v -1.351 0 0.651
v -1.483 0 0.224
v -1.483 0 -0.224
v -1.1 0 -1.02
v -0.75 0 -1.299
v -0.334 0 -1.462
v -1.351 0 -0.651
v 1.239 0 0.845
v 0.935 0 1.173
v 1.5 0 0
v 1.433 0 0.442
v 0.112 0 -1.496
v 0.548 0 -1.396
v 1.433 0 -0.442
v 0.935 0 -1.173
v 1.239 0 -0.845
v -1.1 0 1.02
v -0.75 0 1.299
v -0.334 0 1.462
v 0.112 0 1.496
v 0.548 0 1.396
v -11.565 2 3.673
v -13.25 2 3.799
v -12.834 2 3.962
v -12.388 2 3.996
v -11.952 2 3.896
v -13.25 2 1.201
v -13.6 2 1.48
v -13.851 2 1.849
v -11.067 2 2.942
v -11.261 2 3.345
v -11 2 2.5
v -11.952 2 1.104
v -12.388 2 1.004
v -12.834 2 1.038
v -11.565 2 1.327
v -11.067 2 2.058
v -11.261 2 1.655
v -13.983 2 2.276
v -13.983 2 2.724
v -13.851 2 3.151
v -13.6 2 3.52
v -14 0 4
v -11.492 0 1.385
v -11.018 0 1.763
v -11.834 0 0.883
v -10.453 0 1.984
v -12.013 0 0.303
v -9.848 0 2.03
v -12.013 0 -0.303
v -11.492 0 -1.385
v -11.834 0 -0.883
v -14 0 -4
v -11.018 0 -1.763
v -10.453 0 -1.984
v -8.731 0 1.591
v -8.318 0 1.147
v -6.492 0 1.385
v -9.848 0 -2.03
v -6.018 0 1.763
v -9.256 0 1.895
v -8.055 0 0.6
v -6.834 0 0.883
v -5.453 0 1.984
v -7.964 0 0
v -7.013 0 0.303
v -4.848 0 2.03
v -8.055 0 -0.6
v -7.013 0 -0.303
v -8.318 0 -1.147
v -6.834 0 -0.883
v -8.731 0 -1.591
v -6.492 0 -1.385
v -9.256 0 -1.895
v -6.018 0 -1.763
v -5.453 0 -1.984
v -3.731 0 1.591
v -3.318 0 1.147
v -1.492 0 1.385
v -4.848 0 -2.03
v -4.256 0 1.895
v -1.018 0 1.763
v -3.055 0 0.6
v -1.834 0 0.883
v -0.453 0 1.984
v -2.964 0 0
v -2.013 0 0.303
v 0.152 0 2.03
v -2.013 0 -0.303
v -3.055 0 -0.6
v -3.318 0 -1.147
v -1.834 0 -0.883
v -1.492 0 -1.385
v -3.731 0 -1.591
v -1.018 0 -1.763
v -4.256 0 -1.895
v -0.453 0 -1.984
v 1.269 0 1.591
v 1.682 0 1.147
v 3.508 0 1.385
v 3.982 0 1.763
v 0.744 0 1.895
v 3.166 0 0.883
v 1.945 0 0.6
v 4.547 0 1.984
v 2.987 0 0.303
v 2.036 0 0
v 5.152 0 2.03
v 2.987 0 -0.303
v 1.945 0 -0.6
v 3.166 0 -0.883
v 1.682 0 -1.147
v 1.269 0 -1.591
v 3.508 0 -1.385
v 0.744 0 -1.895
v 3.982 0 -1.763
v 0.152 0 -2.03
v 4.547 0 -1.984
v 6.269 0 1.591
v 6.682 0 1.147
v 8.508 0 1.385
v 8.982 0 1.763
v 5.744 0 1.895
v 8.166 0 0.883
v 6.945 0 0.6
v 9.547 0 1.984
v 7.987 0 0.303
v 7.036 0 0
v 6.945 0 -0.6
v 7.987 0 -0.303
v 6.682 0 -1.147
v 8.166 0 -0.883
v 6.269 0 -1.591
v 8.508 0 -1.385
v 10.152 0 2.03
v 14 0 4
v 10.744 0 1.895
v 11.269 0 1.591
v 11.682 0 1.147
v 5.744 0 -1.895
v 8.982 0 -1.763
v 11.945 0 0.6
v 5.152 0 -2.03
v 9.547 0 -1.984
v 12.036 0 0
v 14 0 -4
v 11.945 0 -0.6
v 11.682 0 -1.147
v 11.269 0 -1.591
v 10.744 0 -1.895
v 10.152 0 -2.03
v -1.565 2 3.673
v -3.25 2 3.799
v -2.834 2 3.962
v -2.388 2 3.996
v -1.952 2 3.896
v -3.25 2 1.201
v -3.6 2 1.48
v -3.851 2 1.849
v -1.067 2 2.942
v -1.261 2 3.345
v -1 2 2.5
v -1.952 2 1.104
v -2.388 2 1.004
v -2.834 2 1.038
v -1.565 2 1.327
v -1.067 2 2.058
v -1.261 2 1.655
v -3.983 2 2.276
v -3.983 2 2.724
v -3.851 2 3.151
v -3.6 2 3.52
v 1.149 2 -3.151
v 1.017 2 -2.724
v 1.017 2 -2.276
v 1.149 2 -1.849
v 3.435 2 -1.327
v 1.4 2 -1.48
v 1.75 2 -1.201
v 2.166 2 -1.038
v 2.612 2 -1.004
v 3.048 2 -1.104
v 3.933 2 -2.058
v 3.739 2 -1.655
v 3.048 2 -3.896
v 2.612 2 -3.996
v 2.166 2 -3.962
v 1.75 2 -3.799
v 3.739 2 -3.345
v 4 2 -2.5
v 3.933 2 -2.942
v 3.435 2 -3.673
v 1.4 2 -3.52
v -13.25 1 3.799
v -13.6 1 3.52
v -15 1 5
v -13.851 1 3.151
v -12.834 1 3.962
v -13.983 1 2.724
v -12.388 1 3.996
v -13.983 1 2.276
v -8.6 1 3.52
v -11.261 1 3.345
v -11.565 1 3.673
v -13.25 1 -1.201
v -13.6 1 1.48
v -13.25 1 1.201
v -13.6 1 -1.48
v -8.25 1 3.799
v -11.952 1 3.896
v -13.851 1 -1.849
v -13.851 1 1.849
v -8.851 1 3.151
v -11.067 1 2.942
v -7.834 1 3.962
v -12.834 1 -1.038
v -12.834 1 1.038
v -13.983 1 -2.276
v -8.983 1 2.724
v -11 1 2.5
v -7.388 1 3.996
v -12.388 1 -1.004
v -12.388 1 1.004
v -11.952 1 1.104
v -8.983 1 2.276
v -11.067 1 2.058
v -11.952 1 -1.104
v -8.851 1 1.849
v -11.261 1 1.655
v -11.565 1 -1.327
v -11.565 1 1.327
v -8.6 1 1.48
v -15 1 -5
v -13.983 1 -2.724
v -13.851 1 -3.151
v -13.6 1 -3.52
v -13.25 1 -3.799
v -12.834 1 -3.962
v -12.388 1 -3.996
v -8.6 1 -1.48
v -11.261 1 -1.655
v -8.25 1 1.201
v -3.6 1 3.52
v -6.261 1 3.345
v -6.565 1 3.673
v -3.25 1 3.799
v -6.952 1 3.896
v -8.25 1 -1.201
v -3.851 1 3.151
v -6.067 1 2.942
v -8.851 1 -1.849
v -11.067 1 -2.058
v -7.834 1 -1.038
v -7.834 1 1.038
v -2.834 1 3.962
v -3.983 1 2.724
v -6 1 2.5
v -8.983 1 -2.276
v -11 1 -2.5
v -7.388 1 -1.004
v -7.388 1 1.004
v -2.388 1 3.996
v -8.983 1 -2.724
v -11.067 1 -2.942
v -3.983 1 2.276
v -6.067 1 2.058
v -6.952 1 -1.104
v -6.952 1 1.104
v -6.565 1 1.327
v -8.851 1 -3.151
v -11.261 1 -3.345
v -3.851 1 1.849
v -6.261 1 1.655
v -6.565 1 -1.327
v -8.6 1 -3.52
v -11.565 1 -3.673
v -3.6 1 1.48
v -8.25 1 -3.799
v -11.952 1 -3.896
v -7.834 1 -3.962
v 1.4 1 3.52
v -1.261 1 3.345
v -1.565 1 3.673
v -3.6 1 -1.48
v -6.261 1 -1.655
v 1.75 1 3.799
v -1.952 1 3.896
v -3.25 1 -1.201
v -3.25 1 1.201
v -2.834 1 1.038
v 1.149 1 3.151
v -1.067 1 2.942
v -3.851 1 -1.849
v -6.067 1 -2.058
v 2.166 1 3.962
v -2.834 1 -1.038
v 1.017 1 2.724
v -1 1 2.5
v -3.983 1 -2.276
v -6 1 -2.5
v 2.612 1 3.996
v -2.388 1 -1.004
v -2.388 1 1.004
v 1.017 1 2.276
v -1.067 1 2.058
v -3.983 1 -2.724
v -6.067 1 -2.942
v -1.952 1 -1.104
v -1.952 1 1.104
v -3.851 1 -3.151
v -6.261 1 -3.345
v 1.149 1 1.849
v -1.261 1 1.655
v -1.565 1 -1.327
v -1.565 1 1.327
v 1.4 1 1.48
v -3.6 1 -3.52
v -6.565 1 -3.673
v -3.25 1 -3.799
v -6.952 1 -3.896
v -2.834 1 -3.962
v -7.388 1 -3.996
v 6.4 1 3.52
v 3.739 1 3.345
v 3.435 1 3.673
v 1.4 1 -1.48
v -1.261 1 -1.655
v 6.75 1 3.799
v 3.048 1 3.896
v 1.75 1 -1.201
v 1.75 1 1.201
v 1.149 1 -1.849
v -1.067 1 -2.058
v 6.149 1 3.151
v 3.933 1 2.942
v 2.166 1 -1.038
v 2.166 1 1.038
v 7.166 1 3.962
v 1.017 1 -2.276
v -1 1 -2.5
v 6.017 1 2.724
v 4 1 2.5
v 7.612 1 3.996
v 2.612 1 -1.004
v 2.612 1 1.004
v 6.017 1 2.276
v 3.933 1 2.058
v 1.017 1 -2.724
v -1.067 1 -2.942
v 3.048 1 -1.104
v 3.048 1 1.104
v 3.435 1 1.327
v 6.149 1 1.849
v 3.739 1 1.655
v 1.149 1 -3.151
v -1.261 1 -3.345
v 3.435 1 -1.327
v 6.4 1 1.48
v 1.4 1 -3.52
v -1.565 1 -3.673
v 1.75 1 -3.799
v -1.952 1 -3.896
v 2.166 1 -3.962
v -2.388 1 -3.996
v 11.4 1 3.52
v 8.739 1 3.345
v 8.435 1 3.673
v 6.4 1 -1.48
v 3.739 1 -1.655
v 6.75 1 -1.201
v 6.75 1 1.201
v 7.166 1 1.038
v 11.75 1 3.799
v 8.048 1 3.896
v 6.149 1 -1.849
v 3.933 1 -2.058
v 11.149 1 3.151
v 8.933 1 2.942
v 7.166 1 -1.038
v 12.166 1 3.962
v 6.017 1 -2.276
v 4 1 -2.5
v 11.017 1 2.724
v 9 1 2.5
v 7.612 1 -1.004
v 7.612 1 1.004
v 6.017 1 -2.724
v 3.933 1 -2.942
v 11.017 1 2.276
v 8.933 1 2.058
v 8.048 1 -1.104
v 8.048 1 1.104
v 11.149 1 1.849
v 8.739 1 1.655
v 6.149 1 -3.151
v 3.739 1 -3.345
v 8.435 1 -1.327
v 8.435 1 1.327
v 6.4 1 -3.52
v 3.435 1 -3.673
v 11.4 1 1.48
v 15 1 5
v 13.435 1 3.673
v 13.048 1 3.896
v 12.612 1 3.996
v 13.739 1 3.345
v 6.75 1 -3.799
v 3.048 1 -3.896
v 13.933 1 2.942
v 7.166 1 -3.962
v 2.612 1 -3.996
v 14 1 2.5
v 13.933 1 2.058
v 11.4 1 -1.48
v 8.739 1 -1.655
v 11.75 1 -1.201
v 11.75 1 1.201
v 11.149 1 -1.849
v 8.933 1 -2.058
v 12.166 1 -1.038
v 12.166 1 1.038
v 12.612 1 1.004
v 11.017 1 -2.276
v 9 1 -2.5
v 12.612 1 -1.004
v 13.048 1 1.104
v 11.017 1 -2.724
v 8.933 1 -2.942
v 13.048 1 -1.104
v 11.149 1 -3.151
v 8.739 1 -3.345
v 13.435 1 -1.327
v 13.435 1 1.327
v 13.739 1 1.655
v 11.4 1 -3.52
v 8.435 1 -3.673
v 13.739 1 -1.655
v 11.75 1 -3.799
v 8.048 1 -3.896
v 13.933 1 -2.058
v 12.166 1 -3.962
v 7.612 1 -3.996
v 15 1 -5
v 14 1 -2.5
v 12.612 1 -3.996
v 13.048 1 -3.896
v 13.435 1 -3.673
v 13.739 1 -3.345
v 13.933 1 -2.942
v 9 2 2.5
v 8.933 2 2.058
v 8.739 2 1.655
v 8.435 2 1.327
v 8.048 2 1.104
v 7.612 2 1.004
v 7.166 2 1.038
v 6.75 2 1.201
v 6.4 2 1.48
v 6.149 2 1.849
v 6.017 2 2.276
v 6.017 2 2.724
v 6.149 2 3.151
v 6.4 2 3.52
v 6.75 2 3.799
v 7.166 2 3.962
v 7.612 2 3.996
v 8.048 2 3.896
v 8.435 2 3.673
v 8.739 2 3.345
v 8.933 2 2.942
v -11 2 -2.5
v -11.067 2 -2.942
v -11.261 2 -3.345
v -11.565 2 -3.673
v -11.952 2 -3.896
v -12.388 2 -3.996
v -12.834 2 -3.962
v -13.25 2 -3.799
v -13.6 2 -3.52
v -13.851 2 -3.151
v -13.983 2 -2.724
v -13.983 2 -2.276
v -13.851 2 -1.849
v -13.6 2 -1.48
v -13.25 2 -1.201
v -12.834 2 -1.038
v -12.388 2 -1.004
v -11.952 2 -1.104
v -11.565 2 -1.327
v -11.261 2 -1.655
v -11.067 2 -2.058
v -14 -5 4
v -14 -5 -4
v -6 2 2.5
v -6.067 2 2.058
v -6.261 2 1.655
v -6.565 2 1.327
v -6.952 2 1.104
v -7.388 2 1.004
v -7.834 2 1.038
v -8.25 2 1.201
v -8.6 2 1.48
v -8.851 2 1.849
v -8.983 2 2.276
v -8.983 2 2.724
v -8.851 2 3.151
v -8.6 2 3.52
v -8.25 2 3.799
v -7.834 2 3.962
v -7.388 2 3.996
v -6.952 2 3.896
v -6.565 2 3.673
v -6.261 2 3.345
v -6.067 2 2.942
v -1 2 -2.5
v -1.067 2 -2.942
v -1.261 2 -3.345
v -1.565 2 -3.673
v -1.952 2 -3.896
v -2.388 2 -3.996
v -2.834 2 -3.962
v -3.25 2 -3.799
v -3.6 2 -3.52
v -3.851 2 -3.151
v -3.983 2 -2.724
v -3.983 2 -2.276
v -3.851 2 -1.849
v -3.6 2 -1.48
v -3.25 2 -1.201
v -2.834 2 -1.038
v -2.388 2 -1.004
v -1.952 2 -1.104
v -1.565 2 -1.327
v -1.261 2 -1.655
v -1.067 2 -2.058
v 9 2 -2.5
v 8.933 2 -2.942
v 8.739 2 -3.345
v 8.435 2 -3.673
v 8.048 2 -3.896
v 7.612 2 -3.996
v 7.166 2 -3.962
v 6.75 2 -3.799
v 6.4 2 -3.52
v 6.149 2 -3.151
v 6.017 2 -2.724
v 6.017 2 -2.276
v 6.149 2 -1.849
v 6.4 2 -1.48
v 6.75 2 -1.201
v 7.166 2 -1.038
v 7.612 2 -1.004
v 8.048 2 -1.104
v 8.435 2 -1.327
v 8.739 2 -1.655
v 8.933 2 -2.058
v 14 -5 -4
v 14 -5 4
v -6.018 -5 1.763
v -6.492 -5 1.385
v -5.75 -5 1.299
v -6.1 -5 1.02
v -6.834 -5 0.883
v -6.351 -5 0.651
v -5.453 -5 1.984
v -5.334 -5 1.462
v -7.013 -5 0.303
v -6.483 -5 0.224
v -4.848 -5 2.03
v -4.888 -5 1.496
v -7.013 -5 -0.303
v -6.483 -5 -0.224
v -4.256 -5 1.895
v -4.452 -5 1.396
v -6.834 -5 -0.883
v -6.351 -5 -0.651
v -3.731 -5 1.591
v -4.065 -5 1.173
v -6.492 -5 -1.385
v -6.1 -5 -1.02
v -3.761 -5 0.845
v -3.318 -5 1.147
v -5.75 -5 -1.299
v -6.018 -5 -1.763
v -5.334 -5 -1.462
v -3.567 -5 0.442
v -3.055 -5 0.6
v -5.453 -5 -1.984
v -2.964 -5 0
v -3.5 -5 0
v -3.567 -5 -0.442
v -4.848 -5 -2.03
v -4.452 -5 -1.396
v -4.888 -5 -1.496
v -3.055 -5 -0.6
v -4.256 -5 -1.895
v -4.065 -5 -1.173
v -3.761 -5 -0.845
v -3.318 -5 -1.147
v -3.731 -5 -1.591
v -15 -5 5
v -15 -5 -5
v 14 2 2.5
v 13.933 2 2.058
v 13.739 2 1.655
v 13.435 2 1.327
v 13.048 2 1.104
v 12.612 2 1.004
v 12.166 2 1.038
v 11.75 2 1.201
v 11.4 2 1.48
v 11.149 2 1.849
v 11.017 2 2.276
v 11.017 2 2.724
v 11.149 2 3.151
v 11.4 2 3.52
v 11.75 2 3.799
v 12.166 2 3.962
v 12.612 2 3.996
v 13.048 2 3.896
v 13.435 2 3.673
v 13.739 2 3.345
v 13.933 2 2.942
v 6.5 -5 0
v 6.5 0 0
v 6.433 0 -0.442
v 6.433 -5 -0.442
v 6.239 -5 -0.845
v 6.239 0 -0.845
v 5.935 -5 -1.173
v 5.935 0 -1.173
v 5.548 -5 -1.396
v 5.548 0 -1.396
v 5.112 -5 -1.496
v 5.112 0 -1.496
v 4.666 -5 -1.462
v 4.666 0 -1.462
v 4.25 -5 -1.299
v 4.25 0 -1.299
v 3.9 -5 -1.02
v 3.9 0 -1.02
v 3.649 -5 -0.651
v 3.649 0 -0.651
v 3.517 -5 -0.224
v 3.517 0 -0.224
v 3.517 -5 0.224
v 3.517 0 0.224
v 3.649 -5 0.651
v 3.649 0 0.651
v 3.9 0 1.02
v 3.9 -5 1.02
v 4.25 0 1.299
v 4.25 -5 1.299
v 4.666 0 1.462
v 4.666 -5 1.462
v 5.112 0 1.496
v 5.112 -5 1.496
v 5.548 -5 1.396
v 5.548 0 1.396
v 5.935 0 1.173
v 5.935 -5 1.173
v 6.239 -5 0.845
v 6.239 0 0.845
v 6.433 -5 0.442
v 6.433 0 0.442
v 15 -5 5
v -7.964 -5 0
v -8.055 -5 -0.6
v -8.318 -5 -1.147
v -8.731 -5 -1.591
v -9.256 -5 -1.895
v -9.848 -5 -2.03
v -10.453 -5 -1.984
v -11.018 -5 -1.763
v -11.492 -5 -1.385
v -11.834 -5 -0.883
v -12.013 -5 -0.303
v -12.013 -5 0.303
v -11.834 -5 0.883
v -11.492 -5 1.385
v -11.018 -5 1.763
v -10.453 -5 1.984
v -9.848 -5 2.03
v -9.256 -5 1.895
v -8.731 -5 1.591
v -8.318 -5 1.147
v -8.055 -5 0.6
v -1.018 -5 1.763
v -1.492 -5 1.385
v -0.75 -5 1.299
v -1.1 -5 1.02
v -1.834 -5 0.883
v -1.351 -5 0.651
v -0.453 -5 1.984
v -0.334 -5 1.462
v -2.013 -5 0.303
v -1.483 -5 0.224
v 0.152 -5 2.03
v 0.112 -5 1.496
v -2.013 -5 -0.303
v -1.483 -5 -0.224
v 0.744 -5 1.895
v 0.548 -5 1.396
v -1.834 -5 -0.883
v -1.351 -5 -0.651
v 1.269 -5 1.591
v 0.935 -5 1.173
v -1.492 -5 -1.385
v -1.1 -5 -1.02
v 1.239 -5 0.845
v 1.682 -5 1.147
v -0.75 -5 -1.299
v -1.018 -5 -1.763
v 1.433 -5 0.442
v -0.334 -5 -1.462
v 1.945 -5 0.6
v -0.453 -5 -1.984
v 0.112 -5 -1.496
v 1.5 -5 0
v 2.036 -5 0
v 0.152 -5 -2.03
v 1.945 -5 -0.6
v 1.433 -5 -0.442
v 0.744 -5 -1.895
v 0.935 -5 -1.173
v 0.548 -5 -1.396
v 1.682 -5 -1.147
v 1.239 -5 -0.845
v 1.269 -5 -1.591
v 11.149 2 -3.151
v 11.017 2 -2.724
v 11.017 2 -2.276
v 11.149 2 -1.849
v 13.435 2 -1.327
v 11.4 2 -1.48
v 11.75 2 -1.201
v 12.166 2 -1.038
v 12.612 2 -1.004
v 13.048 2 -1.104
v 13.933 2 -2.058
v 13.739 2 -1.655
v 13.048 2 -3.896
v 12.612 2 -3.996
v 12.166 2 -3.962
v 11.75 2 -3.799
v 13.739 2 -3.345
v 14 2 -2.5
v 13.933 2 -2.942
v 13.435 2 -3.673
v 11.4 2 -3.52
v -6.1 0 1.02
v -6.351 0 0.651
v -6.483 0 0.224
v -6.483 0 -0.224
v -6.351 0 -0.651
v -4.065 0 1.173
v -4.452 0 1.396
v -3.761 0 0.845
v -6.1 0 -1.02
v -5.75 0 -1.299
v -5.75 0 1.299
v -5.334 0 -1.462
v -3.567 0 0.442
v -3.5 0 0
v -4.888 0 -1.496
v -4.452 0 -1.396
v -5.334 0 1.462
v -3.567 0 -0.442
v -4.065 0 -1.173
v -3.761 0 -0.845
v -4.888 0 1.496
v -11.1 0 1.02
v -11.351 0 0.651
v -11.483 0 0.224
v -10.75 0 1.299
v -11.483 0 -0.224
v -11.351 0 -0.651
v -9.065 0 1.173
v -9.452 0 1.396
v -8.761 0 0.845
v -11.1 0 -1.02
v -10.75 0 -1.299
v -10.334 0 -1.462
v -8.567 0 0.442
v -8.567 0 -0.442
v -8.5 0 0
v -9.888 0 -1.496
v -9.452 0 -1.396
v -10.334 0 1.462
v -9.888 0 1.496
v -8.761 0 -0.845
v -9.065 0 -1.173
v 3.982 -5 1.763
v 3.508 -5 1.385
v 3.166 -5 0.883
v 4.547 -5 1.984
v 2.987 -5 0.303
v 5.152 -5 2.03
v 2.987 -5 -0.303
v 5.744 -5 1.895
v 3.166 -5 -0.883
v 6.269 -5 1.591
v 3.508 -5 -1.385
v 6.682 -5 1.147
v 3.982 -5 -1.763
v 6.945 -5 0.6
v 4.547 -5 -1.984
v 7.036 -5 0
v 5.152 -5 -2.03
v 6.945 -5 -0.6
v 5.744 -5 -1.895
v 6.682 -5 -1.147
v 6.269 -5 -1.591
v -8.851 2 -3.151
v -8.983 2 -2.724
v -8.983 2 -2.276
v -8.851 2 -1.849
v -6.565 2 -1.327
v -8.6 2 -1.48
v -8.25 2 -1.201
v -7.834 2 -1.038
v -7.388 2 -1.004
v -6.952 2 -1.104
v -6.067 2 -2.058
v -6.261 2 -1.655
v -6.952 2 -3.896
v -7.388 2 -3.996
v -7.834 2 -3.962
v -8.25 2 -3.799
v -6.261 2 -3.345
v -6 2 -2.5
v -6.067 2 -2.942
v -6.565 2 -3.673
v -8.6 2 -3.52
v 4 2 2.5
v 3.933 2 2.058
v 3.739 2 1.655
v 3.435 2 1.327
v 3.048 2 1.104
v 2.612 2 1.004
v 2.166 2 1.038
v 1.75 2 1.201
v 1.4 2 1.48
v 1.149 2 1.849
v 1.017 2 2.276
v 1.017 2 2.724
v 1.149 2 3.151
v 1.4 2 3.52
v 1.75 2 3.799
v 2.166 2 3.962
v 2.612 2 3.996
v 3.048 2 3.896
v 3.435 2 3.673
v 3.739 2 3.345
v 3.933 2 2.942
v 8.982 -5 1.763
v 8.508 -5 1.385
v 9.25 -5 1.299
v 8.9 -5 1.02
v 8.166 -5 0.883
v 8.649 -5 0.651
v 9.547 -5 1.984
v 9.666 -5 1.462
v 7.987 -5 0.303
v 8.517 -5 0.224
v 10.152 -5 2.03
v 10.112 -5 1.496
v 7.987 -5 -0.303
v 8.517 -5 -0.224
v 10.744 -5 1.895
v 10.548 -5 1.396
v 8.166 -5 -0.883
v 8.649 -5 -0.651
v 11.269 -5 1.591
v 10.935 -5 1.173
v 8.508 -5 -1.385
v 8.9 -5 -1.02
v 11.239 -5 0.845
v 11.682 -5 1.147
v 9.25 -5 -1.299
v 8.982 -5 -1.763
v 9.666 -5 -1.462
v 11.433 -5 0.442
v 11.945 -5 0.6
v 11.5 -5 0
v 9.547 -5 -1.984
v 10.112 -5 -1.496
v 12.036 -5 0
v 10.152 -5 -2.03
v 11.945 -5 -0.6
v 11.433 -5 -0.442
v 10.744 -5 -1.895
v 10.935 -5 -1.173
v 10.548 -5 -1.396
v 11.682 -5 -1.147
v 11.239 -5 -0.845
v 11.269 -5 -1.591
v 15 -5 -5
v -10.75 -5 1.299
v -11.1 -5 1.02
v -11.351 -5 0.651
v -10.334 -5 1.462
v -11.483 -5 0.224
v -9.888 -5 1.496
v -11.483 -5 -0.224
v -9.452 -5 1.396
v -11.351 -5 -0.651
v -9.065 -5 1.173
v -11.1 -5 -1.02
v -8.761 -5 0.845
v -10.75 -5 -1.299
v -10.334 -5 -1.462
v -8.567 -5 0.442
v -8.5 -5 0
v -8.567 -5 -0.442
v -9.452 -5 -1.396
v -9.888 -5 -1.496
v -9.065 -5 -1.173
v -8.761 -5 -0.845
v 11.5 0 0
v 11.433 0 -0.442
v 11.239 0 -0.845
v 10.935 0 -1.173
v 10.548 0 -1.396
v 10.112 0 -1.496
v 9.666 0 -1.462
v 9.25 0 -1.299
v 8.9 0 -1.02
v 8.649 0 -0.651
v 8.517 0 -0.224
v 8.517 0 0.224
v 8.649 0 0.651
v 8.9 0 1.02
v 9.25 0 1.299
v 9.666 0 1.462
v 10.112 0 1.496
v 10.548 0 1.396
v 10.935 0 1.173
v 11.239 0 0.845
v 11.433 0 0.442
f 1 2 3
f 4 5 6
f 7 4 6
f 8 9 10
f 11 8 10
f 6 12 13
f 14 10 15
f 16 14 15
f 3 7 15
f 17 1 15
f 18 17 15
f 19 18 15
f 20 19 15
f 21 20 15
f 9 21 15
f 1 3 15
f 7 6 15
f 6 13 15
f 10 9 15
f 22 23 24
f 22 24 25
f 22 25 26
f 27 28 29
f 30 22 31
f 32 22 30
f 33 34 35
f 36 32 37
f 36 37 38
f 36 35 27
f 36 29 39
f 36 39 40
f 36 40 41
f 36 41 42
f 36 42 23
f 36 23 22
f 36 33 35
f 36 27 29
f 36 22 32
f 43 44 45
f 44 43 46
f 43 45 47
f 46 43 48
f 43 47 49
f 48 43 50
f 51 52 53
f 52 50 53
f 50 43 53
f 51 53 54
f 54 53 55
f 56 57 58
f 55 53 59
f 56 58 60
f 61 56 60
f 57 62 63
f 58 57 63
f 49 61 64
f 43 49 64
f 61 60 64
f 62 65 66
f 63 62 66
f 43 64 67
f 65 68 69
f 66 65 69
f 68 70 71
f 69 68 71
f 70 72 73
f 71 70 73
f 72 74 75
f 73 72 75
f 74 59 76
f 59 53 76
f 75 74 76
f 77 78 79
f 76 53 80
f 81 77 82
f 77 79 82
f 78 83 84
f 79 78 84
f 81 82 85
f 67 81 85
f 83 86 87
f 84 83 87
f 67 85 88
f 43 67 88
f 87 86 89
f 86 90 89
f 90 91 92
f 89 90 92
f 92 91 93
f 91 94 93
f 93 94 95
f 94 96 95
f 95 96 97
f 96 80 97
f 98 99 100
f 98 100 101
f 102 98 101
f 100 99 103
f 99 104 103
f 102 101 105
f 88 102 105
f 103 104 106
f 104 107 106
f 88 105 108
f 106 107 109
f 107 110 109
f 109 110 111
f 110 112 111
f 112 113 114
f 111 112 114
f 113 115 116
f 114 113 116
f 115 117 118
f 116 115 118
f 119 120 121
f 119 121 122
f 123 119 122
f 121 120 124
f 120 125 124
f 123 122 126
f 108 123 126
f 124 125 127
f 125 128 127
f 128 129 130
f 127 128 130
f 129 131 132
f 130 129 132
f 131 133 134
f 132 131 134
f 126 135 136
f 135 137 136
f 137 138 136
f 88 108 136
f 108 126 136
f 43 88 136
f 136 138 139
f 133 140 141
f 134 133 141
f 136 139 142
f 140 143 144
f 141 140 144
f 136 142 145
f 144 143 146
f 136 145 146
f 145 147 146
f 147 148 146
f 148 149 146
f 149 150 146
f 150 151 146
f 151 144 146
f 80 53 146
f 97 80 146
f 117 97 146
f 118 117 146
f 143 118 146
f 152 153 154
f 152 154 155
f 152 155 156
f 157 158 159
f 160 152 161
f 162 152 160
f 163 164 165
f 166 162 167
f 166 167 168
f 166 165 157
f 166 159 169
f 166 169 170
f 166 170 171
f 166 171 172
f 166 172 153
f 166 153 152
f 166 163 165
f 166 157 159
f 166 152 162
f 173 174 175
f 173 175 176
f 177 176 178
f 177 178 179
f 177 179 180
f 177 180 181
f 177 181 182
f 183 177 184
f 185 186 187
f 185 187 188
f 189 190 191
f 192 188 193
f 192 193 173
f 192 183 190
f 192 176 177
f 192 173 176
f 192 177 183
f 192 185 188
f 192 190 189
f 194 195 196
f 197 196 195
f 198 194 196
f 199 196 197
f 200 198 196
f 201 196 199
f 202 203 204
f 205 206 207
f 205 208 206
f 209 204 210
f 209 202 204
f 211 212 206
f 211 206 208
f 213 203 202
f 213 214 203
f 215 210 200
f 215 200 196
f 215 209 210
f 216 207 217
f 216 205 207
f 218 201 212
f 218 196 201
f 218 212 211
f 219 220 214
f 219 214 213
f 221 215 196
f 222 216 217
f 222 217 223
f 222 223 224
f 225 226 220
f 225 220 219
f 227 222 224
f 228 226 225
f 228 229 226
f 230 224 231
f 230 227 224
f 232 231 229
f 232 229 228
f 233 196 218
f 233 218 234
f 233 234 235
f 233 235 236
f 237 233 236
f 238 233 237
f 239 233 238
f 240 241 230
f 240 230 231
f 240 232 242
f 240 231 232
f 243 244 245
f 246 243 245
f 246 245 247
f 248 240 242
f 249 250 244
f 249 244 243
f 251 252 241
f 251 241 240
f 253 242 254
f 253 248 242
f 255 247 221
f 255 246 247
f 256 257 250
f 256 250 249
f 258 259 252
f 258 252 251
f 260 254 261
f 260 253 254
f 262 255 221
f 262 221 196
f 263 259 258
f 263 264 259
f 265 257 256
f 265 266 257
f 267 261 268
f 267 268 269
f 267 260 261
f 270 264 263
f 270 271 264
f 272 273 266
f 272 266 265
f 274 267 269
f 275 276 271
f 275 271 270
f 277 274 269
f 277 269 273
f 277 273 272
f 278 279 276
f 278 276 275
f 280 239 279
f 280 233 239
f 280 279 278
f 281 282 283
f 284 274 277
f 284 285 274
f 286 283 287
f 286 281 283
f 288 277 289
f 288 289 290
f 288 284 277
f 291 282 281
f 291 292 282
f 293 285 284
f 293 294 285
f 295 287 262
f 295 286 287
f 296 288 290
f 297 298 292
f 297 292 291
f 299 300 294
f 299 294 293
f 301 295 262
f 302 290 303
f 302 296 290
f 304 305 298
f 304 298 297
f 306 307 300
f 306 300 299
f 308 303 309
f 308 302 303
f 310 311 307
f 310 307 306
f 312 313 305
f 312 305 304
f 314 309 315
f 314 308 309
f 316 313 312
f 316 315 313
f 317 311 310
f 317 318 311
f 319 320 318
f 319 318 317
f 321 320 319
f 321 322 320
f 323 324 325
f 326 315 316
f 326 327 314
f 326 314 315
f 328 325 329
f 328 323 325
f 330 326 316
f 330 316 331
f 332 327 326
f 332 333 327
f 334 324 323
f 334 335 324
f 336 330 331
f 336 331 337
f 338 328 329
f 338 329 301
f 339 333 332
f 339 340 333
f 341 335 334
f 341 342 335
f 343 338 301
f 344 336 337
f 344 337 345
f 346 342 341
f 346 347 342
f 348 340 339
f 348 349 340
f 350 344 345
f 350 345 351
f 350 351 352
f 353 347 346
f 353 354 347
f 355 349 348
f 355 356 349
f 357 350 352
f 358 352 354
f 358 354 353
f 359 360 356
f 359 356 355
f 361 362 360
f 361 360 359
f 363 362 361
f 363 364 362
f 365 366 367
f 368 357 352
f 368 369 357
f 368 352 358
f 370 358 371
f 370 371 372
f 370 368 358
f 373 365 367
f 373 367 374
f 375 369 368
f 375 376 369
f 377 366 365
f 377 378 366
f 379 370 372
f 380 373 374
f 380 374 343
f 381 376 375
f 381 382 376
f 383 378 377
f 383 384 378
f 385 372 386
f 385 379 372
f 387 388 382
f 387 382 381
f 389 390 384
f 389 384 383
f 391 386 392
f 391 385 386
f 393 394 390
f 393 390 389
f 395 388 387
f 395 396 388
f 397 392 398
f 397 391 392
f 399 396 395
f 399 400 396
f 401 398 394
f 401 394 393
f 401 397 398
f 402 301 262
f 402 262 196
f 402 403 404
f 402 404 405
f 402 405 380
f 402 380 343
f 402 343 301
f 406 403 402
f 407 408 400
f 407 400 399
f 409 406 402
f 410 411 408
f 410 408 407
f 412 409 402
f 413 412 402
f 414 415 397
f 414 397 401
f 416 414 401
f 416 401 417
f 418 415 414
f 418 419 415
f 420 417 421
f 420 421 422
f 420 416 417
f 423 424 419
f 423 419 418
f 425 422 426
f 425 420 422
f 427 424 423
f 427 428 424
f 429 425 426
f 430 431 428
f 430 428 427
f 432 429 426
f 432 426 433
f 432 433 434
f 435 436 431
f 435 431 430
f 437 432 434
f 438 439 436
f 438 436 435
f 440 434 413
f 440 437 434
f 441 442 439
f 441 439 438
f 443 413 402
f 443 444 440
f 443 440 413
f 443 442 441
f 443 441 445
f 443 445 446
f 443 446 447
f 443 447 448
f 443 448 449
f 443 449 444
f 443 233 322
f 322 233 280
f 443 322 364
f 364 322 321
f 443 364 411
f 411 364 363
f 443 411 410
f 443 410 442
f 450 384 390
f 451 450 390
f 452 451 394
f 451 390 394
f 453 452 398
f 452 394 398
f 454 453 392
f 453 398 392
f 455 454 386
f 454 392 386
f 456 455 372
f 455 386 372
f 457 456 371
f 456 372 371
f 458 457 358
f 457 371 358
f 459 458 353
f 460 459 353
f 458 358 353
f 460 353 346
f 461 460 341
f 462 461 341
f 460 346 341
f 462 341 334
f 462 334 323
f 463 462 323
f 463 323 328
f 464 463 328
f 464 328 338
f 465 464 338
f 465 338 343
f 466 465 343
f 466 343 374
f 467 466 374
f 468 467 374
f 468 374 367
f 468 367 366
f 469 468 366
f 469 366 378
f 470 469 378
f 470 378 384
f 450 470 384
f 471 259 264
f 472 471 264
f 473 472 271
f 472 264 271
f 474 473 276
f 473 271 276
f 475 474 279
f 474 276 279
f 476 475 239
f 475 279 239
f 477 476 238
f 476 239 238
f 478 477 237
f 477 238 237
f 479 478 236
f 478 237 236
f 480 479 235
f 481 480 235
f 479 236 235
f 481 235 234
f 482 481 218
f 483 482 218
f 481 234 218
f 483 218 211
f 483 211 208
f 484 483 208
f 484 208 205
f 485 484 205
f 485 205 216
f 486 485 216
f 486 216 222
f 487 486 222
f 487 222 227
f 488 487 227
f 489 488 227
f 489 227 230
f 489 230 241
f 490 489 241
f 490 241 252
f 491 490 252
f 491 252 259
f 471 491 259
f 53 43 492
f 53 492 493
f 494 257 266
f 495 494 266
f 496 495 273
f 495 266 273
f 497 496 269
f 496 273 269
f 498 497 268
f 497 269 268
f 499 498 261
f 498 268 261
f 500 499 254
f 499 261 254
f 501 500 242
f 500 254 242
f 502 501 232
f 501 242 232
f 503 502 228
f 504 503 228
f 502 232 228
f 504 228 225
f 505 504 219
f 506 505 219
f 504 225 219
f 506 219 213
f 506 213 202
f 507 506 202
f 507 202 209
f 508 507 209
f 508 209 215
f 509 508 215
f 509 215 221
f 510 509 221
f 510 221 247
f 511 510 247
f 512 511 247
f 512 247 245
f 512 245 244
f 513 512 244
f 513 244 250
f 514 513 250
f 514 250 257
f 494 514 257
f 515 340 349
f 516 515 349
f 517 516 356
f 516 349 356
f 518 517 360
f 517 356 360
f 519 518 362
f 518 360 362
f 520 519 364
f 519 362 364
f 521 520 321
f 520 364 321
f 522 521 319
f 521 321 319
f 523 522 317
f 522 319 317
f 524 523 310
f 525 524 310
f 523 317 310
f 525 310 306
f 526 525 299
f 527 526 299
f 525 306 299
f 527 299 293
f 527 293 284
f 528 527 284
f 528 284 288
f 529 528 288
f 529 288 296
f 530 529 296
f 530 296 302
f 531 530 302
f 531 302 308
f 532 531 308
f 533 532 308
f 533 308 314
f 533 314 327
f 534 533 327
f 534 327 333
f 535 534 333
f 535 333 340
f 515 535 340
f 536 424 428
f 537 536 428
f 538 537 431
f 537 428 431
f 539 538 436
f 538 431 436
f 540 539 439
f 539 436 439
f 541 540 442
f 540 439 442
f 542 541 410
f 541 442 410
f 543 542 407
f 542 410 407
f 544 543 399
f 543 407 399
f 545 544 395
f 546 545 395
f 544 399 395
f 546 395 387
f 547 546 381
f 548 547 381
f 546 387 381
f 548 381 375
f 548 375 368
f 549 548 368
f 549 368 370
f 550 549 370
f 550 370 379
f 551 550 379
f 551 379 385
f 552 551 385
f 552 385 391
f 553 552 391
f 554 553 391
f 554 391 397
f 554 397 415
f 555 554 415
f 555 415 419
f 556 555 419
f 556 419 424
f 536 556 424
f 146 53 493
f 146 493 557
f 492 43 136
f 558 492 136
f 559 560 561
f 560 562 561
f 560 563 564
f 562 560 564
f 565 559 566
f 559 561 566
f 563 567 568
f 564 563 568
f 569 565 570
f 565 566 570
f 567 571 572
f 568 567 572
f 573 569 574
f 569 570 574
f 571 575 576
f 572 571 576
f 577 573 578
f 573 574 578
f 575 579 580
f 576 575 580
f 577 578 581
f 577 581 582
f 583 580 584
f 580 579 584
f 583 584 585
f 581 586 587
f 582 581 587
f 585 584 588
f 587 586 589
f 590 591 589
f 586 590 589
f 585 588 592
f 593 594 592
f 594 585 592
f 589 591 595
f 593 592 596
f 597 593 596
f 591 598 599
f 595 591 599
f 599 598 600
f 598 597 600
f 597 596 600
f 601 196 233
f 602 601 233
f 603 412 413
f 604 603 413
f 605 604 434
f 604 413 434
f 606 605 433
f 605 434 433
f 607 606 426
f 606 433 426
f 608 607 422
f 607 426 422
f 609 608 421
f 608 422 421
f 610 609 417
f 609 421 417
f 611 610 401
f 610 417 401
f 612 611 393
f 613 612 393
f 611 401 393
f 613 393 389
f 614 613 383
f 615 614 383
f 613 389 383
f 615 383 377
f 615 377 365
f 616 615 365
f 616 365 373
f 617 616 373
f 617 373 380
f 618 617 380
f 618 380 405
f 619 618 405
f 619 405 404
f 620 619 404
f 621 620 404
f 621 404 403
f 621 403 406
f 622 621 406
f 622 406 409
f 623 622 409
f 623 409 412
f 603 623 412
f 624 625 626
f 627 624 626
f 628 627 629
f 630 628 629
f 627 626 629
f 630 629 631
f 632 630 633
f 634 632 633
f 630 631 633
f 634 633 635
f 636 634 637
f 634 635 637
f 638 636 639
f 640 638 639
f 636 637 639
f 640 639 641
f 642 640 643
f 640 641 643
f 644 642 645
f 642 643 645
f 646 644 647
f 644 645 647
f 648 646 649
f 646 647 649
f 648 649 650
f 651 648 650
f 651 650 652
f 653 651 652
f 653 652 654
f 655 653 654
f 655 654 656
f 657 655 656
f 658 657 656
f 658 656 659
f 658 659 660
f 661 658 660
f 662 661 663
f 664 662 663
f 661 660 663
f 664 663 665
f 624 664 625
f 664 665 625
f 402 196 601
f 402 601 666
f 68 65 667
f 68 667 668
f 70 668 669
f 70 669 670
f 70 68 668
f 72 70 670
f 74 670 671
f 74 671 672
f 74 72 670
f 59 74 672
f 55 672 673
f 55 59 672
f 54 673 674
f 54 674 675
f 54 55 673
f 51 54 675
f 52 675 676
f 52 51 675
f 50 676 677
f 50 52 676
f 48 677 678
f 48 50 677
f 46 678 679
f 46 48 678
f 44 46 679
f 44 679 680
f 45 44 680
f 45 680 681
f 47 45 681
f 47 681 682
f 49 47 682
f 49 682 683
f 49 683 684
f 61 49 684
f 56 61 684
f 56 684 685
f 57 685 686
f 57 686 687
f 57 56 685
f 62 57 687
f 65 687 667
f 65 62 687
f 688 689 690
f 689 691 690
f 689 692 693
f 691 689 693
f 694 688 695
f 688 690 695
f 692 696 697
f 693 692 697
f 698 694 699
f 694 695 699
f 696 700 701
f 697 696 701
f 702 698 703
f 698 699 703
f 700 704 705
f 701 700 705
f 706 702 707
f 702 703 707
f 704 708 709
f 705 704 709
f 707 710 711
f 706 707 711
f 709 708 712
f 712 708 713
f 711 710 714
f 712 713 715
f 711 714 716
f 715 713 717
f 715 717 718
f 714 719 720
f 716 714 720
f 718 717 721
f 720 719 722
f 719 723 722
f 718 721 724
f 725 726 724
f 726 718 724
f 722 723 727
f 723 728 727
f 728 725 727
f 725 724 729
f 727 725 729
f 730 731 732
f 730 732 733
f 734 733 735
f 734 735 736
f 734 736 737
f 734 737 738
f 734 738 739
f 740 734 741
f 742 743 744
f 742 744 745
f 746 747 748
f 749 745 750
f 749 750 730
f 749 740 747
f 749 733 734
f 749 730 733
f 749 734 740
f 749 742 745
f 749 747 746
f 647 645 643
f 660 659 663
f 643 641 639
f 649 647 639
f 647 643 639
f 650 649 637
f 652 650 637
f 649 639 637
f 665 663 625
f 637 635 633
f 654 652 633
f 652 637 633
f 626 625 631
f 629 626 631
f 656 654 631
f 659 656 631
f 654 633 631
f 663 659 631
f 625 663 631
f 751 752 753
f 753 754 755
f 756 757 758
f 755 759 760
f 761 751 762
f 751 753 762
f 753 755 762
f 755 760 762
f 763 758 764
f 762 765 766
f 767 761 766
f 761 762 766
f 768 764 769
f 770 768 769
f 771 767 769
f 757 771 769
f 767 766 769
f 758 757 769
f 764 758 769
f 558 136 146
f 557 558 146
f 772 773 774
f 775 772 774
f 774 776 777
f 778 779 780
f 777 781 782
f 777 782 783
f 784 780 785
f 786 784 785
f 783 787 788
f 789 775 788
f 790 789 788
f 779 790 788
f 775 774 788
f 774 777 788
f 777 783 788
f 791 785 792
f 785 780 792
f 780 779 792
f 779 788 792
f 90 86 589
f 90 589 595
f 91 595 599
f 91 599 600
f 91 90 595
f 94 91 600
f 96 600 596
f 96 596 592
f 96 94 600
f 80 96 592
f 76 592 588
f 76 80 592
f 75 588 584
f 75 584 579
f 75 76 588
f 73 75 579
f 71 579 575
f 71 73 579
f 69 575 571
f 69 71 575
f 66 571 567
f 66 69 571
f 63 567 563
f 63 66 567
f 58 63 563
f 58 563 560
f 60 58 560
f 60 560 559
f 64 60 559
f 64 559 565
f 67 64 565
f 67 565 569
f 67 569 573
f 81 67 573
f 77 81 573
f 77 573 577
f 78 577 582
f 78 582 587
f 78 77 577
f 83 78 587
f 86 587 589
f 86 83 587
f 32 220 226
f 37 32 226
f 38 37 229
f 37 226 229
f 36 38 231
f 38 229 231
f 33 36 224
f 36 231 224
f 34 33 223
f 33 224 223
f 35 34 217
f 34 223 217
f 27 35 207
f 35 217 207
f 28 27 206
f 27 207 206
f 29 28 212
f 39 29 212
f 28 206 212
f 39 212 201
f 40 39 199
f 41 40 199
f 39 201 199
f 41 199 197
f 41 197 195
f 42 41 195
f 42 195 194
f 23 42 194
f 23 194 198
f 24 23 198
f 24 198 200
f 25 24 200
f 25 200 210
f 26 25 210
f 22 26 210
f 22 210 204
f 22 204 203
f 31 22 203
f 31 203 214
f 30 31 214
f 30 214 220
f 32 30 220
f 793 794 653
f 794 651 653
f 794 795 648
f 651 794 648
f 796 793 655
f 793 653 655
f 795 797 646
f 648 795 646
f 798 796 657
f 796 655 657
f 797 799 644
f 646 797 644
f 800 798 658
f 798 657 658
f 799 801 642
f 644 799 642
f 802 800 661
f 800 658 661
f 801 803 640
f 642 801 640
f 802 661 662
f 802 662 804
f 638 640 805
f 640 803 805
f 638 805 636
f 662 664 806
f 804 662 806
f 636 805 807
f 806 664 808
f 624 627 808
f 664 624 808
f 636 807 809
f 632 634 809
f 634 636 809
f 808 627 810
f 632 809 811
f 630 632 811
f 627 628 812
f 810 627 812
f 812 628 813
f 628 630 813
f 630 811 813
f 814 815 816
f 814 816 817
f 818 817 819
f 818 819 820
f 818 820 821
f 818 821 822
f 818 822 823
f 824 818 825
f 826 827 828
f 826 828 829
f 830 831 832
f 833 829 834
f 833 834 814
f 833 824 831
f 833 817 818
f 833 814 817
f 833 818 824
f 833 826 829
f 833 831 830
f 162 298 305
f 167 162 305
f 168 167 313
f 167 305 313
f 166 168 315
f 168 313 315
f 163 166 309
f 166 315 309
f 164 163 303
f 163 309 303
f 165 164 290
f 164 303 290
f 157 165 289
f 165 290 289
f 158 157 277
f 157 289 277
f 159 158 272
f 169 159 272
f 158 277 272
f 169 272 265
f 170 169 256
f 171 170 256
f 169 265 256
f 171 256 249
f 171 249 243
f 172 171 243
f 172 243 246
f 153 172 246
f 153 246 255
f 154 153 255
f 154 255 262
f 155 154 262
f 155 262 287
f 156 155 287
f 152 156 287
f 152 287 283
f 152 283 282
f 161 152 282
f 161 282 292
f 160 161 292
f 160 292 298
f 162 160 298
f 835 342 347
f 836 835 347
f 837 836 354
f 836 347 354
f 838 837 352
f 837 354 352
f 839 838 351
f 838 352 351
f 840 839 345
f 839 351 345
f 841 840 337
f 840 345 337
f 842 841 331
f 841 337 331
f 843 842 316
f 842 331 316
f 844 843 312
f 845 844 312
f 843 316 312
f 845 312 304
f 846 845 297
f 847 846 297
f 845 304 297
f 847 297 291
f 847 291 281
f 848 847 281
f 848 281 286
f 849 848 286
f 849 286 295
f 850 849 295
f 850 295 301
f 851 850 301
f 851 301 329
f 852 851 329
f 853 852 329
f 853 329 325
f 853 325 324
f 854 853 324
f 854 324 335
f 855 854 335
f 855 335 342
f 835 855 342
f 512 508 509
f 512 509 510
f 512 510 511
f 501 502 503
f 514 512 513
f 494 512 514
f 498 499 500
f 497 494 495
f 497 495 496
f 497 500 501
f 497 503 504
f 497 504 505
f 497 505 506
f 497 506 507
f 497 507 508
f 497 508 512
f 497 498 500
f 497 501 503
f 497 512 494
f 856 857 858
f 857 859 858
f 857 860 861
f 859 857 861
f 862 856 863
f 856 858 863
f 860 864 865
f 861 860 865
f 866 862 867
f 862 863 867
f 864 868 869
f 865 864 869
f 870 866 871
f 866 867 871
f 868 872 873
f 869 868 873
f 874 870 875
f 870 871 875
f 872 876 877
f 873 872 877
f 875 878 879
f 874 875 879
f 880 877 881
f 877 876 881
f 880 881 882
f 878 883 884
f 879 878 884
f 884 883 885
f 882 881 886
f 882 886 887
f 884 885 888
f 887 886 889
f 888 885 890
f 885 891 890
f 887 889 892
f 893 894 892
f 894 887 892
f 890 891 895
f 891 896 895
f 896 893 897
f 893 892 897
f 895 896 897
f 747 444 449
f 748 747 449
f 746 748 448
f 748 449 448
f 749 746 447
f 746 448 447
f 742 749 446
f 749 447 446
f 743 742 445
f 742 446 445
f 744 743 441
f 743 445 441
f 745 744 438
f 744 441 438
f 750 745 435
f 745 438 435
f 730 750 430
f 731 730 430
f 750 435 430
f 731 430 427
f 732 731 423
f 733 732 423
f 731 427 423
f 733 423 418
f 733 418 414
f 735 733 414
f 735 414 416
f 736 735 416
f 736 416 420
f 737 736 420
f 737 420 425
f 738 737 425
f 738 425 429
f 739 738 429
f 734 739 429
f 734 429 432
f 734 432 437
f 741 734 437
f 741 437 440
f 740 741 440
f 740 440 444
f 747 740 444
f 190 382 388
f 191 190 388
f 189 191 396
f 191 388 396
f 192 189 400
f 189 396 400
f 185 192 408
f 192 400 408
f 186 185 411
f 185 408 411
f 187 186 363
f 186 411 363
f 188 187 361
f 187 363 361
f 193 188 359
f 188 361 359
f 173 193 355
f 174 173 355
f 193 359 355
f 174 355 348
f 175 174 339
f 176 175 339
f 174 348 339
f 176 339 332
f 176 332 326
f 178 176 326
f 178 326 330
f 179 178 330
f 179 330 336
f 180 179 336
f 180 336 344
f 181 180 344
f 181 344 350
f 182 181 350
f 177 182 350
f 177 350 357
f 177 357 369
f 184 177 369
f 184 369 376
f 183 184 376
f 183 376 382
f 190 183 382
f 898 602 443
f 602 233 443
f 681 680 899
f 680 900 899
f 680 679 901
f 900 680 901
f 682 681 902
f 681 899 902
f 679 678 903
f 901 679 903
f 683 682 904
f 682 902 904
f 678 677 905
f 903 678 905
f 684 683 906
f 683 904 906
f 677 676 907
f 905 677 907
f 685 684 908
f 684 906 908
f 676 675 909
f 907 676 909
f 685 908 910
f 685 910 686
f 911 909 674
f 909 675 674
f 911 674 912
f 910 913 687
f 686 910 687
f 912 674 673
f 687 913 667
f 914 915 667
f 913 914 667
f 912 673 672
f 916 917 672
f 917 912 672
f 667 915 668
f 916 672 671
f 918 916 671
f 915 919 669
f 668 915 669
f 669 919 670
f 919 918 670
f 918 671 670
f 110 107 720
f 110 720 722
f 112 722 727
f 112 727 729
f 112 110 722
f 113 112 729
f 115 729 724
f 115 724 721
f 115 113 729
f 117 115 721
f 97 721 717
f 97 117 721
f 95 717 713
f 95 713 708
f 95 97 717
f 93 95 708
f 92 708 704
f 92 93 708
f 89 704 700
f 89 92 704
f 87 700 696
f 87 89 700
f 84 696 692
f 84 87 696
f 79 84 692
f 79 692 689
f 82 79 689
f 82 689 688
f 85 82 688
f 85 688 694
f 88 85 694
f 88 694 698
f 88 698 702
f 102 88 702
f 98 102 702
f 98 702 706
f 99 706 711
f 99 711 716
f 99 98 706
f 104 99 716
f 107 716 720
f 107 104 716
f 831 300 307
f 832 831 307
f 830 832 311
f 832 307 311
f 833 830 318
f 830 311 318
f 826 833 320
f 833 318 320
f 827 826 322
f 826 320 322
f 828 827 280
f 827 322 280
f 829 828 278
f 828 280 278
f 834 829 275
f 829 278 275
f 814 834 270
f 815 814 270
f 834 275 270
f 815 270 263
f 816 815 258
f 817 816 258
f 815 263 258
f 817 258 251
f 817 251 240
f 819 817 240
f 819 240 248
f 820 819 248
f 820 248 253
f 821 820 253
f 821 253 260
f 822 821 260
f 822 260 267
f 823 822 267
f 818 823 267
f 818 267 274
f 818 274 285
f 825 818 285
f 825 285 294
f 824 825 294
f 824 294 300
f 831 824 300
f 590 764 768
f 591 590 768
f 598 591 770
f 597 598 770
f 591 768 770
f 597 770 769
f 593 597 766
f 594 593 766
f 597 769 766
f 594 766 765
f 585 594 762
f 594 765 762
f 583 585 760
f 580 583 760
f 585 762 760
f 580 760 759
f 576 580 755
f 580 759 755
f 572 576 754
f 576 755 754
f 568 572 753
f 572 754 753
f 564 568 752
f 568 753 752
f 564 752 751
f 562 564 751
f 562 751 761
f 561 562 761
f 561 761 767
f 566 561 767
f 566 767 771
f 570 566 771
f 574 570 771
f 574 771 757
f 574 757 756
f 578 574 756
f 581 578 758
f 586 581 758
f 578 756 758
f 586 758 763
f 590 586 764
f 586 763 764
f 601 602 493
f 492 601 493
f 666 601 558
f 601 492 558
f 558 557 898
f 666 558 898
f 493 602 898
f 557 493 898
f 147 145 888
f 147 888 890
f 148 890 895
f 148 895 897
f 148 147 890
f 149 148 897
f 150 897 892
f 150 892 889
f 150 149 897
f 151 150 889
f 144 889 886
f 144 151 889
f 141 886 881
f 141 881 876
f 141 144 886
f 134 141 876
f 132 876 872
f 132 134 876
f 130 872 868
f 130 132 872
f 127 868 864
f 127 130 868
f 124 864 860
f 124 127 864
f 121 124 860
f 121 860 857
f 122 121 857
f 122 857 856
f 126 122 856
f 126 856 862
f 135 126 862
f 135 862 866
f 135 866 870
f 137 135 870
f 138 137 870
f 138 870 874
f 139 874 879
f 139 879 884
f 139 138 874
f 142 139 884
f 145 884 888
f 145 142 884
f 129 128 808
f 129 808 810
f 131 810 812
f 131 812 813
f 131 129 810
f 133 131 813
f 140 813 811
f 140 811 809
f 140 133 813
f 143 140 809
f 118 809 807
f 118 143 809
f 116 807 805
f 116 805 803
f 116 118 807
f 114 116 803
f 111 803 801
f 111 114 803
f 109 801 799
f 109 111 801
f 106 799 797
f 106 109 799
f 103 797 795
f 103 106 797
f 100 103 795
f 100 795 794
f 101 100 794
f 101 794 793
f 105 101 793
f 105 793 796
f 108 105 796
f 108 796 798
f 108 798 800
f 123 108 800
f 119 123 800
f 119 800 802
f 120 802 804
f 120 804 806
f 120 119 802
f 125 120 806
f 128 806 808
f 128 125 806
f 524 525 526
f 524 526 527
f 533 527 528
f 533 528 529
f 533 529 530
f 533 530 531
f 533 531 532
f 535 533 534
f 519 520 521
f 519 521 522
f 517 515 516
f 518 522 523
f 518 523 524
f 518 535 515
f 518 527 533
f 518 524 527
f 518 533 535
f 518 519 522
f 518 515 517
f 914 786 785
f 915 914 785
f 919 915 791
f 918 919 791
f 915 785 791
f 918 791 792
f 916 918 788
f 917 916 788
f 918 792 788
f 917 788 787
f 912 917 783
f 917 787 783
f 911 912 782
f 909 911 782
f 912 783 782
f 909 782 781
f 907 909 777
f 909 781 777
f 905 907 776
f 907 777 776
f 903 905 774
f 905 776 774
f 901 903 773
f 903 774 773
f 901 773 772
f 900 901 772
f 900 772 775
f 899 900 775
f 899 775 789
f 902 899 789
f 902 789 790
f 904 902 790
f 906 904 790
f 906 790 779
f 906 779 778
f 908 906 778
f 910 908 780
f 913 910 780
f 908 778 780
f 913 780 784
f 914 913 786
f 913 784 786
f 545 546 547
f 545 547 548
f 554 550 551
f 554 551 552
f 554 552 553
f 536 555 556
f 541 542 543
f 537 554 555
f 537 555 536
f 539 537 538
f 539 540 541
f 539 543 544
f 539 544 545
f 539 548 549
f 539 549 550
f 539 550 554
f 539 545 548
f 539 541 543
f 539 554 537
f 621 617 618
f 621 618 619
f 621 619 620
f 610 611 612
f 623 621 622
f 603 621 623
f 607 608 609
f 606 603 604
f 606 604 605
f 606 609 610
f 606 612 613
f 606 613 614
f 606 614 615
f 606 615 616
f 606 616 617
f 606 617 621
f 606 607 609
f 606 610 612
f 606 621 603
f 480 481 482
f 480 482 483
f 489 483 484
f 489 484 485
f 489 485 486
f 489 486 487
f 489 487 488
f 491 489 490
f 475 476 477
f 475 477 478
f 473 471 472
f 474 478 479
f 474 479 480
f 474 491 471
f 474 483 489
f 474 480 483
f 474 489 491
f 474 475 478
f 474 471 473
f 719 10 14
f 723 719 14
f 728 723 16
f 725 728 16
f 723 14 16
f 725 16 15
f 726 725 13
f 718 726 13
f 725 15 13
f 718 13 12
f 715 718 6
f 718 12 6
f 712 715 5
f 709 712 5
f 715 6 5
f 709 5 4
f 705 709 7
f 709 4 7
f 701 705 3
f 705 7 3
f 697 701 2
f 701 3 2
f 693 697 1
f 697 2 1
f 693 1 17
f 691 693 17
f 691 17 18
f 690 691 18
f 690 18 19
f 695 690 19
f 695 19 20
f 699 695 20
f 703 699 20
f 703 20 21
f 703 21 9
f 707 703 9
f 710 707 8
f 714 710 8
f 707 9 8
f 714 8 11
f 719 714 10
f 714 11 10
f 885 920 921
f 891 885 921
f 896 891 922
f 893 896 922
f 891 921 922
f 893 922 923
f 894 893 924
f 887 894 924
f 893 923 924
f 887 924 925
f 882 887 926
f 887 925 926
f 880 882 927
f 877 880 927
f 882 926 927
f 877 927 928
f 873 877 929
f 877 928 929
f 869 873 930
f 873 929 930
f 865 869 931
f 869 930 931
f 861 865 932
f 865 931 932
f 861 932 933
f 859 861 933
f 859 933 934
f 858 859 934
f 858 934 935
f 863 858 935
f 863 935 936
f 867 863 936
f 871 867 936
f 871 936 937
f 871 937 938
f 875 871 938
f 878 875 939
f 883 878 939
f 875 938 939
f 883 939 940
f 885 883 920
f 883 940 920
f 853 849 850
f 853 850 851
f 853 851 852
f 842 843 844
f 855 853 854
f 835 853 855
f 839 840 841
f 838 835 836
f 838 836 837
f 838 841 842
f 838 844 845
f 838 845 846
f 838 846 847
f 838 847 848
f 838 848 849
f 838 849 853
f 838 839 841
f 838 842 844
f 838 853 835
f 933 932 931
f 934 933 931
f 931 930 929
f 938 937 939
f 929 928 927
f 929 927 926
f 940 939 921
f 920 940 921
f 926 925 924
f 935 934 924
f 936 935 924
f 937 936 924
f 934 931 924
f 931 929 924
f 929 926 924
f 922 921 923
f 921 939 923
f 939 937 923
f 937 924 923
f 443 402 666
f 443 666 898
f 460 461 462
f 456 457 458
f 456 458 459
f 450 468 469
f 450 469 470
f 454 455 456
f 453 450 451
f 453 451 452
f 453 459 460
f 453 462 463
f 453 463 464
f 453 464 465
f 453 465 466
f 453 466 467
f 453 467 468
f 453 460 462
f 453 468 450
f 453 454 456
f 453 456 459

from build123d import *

# Parameters (mm, degrees)
SKETCH1_R              = 1.5
BOSS_EXTRUDE1_DEPTH    = 2
BOSS_EXTRUDE1_2_DEPTH  = 2
BOSS_EXTRUDE1_3_DEPTH  = 2
BOSS_EXTRUDE1_4_DEPTH  = 2
BOSS_EXTRUDE1_5_DEPTH  = 2
BOSS_EXTRUDE1_6_DEPTH  = 2
BOSS_EXTRUDE1_7_DEPTH  = 2
BOSS_EXTRUDE1_8_DEPTH  = 2
BOSS_EXTRUDE1_9_DEPTH  = 2
BOSS_EXTRUDE1_10_DEPTH = 2
BOSS_EXTRUDE1_11_DEPTH = 2
BOSS_EXTRUDE1_12_DEPTH = 2
SKETCH1_3_W            = 30
SKETCH1_3_H            = 10
BOSS_EXTRUDE2_DEPTH    = 1
SKETCH1_4_W            = 30
SKETCH1_4_H            = 10
SKETCH1_4_W_2          = 28
SKETCH1_4_H_2          = 8
SKETCH1_4_R            = 2.035533906
SKETCH1_4_R_2          = 1.5
BOSS_EXTRUDE3_DEPTH    = 5


with BuildPart() as part:
    # Sketch1 → Boss-Extrude1 (new body)
    with BuildSketch(Plane(origin=(0, 0, 0), x_dir=(1, 0, 0), z_dir=(0, 1, 0))):
        with Locations((-12.5, 2.5)):
            Circle(SKETCH1_R)
    extrude(amount=BOSS_EXTRUDE1_DEPTH)



with BuildPart() as body_2:
    # Sketch1 → Boss-Extrude1 2 (new body)
    with BuildSketch(Plane(origin=(0, 0, 0), x_dir=(1, 0, 0), z_dir=(0, 1, 0))):
        with Locations((-7.5, 2.5)):
            Circle(SKETCH1_R)
    extrude(amount=BOSS_EXTRUDE1_2_DEPTH)


with BuildPart() as body_3:
    # Sketch1 → Boss-Extrude1 3 (new body)
    with BuildSketch(Plane(origin=(0, 0, 0), x_dir=(1, 0, 0), z_dir=(0, 1, 0))):
        with Locations((-12.5, -2.5)):
            Circle(SKETCH1_R)
    extrude(amount=BOSS_EXTRUDE1_3_DEPTH)


with BuildPart() as body_4:
    # Sketch1 → Boss-Extrude1 4 (new body)
    with BuildSketch(Plane(origin=(0, 0, 0), x_dir=(1, 0, 0), z_dir=(0, 1, 0))):
        with Locations((-2.5, 2.5)):
            Circle(SKETCH1_R)
    extrude(amount=BOSS_EXTRUDE1_4_DEPTH)


with BuildPart() as body_5:
    # Sketch1 → Boss-Extrude1 5 (new body)
    with BuildSketch(Plane(origin=(0, 0, 0), x_dir=(1, 0, 0), z_dir=(0, 1, 0))):
        with Locations((2.5, 2.5)):
            Circle(SKETCH1_R)
    extrude(amount=BOSS_EXTRUDE1_5_DEPTH)


with BuildPart() as body_6:
    # Sketch1 → Boss-Extrude1 6 (new body)
    with BuildSketch(Plane(origin=(0, 0, 0), x_dir=(1, 0, 0), z_dir=(0, 1, 0))):
        with Locations((-7.5, -2.5)):
            Circle(SKETCH1_R)
    extrude(amount=BOSS_EXTRUDE1_6_DEPTH)


with BuildPart() as body_7:
    # Sketch1 → Boss-Extrude1 7 (new body)
    with BuildSketch(Plane(origin=(0, 0, 0), x_dir=(1, 0, 0), z_dir=(0, 1, 0))):
        with Locations((7.5, 2.5)):
            Circle(SKETCH1_R)
    extrude(amount=BOSS_EXTRUDE1_7_DEPTH)


with BuildPart() as body_8:
    # Sketch1 → Boss-Extrude1 8 (new body)
    with BuildSketch(Plane(origin=(0, 0, 0), x_dir=(1, 0, 0), z_dir=(0, 1, 0))):
        with Locations((-2.5, -2.5)):
            Circle(SKETCH1_R)
    extrude(amount=BOSS_EXTRUDE1_8_DEPTH)


with BuildPart() as body_9:
    # Sketch1 → Boss-Extrude1 9 (new body)
    with BuildSketch(Plane(origin=(0, 0, 0), x_dir=(1, 0, 0), z_dir=(0, 1, 0))):
        with Locations((12.5, 2.5)):
            Circle(SKETCH1_R)
    extrude(amount=BOSS_EXTRUDE1_9_DEPTH)


with BuildPart() as body_10:
    # Sketch1 → Boss-Extrude1 10 (new body)
    with BuildSketch(Plane(origin=(0, 0, 0), x_dir=(1, 0, 0), z_dir=(0, 1, 0))):
        with Locations((2.5, -2.5)):
            Circle(SKETCH1_R)
    extrude(amount=BOSS_EXTRUDE1_10_DEPTH)


with BuildPart() as body_11:
    # Sketch1 → Boss-Extrude1 11 (new body)
    with BuildSketch(Plane(origin=(0, 0, 0), x_dir=(1, 0, 0), z_dir=(0, 1, 0))):
        with Locations((7.5, -2.5)):
            Circle(SKETCH1_R)
    extrude(amount=BOSS_EXTRUDE1_11_DEPTH)


with BuildPart() as body_12:
    # Sketch1 → Boss-Extrude1 12 (new body)
    with BuildSketch(Plane(origin=(0, 0, 0), x_dir=(1, 0, 0), z_dir=(0, 1, 0))):
        with Locations((12.5, -2.5)):
            Circle(SKETCH1_R)
    extrude(amount=BOSS_EXTRUDE1_12_DEPTH)


with BuildPart() as part_1:
    add(part.part)

    add(body_2.part)  # Boss-Extrude2 merges body 2

    add(body_3.part)  # Boss-Extrude2 merges body 3

    add(body_4.part)  # Boss-Extrude2 merges body 4

    add(body_5.part)  # Boss-Extrude2 merges body 5

    add(body_6.part)  # Boss-Extrude2 merges body 6

    add(body_7.part)  # Boss-Extrude2 merges body 7

    add(body_8.part)  # Boss-Extrude2 merges body 8

    add(body_9.part)  # Boss-Extrude2 merges body 9

    add(body_10.part)  # Boss-Extrude2 merges body 10

    add(body_11.part)  # Boss-Extrude2 merges body 11

    add(body_12.part)  # Boss-Extrude2 merges body 12
    # Sketch1<3> → Boss-Extrude2 (add)
    with BuildSketch(Plane(origin=(0, 0, 0), x_dir=(1, 0, 0), z_dir=(0, 1, 0))):
        Rectangle(SKETCH1_3_W, SKETCH1_3_H)
    extrude(amount=BOSS_EXTRUDE2_DEPTH)

    # Sketch1<4> → Boss-Extrude3 (add)
    # profile 1 of 6: a face of its own
    with BuildSketch(Plane(origin=(0, 0, 0), x_dir=(1, 0, 0), z_dir=(0, 1, 0))):
        Rectangle(SKETCH1_4_W, SKETCH1_4_H)
        Rectangle(SKETCH1_4_W_2, SKETCH1_4_H_2, mode=Mode.SUBTRACT)
    # profile 2 of 6: a face of its own
    with BuildSketch(Plane(origin=(0, 0, 0), x_dir=(1, 0, 0), z_dir=(0, 1, 0))):
        with Locations((-10, 0)):
            Circle(SKETCH1_4_R)
        with Locations((-10, 0)):
            Circle(SKETCH1_4_R_2, mode=Mode.SUBTRACT)
    # profile 3 of 6: a face of its own
    with BuildSketch(Plane(origin=(0, 0, 0), x_dir=(1, 0, 0), z_dir=(0, 1, 0))):
        with Locations((-5, 0)):
            Circle(SKETCH1_4_R)
        with Locations((-5, 0)):
            Circle(SKETCH1_4_R_2, mode=Mode.SUBTRACT)
    # profile 4 of 6: a face of its own
    with BuildSketch(Plane(origin=(0, 0, 0), x_dir=(1, 0, 0), z_dir=(0, 1, 0))):
        Circle(SKETCH1_4_R)
        Circle(SKETCH1_4_R_2, mode=Mode.SUBTRACT)
    # profile 5 of 6: a face of its own
    with BuildSketch(Plane(origin=(0, 0, 0), x_dir=(1, 0, 0), z_dir=(0, 1, 0))):
        with Locations((5, 0)):
            Circle(SKETCH1_4_R)
        with Locations((5, 0)):
            Circle(SKETCH1_4_R_2, mode=Mode.SUBTRACT)
    # profile 6 of 6: a face of its own
    with BuildSketch(Plane(origin=(0, 0, 0), x_dir=(1, 0, 0), z_dir=(0, 1, 0))):
        with Locations((10, 0)):
            Circle(SKETCH1_4_R)
        with Locations((10, 0)):
            Circle(SKETCH1_4_R_2, mode=Mode.SUBTRACT)
    extrude(amount=-BOSS_EXTRUDE3_DEPTH)


solid = part_1.part
